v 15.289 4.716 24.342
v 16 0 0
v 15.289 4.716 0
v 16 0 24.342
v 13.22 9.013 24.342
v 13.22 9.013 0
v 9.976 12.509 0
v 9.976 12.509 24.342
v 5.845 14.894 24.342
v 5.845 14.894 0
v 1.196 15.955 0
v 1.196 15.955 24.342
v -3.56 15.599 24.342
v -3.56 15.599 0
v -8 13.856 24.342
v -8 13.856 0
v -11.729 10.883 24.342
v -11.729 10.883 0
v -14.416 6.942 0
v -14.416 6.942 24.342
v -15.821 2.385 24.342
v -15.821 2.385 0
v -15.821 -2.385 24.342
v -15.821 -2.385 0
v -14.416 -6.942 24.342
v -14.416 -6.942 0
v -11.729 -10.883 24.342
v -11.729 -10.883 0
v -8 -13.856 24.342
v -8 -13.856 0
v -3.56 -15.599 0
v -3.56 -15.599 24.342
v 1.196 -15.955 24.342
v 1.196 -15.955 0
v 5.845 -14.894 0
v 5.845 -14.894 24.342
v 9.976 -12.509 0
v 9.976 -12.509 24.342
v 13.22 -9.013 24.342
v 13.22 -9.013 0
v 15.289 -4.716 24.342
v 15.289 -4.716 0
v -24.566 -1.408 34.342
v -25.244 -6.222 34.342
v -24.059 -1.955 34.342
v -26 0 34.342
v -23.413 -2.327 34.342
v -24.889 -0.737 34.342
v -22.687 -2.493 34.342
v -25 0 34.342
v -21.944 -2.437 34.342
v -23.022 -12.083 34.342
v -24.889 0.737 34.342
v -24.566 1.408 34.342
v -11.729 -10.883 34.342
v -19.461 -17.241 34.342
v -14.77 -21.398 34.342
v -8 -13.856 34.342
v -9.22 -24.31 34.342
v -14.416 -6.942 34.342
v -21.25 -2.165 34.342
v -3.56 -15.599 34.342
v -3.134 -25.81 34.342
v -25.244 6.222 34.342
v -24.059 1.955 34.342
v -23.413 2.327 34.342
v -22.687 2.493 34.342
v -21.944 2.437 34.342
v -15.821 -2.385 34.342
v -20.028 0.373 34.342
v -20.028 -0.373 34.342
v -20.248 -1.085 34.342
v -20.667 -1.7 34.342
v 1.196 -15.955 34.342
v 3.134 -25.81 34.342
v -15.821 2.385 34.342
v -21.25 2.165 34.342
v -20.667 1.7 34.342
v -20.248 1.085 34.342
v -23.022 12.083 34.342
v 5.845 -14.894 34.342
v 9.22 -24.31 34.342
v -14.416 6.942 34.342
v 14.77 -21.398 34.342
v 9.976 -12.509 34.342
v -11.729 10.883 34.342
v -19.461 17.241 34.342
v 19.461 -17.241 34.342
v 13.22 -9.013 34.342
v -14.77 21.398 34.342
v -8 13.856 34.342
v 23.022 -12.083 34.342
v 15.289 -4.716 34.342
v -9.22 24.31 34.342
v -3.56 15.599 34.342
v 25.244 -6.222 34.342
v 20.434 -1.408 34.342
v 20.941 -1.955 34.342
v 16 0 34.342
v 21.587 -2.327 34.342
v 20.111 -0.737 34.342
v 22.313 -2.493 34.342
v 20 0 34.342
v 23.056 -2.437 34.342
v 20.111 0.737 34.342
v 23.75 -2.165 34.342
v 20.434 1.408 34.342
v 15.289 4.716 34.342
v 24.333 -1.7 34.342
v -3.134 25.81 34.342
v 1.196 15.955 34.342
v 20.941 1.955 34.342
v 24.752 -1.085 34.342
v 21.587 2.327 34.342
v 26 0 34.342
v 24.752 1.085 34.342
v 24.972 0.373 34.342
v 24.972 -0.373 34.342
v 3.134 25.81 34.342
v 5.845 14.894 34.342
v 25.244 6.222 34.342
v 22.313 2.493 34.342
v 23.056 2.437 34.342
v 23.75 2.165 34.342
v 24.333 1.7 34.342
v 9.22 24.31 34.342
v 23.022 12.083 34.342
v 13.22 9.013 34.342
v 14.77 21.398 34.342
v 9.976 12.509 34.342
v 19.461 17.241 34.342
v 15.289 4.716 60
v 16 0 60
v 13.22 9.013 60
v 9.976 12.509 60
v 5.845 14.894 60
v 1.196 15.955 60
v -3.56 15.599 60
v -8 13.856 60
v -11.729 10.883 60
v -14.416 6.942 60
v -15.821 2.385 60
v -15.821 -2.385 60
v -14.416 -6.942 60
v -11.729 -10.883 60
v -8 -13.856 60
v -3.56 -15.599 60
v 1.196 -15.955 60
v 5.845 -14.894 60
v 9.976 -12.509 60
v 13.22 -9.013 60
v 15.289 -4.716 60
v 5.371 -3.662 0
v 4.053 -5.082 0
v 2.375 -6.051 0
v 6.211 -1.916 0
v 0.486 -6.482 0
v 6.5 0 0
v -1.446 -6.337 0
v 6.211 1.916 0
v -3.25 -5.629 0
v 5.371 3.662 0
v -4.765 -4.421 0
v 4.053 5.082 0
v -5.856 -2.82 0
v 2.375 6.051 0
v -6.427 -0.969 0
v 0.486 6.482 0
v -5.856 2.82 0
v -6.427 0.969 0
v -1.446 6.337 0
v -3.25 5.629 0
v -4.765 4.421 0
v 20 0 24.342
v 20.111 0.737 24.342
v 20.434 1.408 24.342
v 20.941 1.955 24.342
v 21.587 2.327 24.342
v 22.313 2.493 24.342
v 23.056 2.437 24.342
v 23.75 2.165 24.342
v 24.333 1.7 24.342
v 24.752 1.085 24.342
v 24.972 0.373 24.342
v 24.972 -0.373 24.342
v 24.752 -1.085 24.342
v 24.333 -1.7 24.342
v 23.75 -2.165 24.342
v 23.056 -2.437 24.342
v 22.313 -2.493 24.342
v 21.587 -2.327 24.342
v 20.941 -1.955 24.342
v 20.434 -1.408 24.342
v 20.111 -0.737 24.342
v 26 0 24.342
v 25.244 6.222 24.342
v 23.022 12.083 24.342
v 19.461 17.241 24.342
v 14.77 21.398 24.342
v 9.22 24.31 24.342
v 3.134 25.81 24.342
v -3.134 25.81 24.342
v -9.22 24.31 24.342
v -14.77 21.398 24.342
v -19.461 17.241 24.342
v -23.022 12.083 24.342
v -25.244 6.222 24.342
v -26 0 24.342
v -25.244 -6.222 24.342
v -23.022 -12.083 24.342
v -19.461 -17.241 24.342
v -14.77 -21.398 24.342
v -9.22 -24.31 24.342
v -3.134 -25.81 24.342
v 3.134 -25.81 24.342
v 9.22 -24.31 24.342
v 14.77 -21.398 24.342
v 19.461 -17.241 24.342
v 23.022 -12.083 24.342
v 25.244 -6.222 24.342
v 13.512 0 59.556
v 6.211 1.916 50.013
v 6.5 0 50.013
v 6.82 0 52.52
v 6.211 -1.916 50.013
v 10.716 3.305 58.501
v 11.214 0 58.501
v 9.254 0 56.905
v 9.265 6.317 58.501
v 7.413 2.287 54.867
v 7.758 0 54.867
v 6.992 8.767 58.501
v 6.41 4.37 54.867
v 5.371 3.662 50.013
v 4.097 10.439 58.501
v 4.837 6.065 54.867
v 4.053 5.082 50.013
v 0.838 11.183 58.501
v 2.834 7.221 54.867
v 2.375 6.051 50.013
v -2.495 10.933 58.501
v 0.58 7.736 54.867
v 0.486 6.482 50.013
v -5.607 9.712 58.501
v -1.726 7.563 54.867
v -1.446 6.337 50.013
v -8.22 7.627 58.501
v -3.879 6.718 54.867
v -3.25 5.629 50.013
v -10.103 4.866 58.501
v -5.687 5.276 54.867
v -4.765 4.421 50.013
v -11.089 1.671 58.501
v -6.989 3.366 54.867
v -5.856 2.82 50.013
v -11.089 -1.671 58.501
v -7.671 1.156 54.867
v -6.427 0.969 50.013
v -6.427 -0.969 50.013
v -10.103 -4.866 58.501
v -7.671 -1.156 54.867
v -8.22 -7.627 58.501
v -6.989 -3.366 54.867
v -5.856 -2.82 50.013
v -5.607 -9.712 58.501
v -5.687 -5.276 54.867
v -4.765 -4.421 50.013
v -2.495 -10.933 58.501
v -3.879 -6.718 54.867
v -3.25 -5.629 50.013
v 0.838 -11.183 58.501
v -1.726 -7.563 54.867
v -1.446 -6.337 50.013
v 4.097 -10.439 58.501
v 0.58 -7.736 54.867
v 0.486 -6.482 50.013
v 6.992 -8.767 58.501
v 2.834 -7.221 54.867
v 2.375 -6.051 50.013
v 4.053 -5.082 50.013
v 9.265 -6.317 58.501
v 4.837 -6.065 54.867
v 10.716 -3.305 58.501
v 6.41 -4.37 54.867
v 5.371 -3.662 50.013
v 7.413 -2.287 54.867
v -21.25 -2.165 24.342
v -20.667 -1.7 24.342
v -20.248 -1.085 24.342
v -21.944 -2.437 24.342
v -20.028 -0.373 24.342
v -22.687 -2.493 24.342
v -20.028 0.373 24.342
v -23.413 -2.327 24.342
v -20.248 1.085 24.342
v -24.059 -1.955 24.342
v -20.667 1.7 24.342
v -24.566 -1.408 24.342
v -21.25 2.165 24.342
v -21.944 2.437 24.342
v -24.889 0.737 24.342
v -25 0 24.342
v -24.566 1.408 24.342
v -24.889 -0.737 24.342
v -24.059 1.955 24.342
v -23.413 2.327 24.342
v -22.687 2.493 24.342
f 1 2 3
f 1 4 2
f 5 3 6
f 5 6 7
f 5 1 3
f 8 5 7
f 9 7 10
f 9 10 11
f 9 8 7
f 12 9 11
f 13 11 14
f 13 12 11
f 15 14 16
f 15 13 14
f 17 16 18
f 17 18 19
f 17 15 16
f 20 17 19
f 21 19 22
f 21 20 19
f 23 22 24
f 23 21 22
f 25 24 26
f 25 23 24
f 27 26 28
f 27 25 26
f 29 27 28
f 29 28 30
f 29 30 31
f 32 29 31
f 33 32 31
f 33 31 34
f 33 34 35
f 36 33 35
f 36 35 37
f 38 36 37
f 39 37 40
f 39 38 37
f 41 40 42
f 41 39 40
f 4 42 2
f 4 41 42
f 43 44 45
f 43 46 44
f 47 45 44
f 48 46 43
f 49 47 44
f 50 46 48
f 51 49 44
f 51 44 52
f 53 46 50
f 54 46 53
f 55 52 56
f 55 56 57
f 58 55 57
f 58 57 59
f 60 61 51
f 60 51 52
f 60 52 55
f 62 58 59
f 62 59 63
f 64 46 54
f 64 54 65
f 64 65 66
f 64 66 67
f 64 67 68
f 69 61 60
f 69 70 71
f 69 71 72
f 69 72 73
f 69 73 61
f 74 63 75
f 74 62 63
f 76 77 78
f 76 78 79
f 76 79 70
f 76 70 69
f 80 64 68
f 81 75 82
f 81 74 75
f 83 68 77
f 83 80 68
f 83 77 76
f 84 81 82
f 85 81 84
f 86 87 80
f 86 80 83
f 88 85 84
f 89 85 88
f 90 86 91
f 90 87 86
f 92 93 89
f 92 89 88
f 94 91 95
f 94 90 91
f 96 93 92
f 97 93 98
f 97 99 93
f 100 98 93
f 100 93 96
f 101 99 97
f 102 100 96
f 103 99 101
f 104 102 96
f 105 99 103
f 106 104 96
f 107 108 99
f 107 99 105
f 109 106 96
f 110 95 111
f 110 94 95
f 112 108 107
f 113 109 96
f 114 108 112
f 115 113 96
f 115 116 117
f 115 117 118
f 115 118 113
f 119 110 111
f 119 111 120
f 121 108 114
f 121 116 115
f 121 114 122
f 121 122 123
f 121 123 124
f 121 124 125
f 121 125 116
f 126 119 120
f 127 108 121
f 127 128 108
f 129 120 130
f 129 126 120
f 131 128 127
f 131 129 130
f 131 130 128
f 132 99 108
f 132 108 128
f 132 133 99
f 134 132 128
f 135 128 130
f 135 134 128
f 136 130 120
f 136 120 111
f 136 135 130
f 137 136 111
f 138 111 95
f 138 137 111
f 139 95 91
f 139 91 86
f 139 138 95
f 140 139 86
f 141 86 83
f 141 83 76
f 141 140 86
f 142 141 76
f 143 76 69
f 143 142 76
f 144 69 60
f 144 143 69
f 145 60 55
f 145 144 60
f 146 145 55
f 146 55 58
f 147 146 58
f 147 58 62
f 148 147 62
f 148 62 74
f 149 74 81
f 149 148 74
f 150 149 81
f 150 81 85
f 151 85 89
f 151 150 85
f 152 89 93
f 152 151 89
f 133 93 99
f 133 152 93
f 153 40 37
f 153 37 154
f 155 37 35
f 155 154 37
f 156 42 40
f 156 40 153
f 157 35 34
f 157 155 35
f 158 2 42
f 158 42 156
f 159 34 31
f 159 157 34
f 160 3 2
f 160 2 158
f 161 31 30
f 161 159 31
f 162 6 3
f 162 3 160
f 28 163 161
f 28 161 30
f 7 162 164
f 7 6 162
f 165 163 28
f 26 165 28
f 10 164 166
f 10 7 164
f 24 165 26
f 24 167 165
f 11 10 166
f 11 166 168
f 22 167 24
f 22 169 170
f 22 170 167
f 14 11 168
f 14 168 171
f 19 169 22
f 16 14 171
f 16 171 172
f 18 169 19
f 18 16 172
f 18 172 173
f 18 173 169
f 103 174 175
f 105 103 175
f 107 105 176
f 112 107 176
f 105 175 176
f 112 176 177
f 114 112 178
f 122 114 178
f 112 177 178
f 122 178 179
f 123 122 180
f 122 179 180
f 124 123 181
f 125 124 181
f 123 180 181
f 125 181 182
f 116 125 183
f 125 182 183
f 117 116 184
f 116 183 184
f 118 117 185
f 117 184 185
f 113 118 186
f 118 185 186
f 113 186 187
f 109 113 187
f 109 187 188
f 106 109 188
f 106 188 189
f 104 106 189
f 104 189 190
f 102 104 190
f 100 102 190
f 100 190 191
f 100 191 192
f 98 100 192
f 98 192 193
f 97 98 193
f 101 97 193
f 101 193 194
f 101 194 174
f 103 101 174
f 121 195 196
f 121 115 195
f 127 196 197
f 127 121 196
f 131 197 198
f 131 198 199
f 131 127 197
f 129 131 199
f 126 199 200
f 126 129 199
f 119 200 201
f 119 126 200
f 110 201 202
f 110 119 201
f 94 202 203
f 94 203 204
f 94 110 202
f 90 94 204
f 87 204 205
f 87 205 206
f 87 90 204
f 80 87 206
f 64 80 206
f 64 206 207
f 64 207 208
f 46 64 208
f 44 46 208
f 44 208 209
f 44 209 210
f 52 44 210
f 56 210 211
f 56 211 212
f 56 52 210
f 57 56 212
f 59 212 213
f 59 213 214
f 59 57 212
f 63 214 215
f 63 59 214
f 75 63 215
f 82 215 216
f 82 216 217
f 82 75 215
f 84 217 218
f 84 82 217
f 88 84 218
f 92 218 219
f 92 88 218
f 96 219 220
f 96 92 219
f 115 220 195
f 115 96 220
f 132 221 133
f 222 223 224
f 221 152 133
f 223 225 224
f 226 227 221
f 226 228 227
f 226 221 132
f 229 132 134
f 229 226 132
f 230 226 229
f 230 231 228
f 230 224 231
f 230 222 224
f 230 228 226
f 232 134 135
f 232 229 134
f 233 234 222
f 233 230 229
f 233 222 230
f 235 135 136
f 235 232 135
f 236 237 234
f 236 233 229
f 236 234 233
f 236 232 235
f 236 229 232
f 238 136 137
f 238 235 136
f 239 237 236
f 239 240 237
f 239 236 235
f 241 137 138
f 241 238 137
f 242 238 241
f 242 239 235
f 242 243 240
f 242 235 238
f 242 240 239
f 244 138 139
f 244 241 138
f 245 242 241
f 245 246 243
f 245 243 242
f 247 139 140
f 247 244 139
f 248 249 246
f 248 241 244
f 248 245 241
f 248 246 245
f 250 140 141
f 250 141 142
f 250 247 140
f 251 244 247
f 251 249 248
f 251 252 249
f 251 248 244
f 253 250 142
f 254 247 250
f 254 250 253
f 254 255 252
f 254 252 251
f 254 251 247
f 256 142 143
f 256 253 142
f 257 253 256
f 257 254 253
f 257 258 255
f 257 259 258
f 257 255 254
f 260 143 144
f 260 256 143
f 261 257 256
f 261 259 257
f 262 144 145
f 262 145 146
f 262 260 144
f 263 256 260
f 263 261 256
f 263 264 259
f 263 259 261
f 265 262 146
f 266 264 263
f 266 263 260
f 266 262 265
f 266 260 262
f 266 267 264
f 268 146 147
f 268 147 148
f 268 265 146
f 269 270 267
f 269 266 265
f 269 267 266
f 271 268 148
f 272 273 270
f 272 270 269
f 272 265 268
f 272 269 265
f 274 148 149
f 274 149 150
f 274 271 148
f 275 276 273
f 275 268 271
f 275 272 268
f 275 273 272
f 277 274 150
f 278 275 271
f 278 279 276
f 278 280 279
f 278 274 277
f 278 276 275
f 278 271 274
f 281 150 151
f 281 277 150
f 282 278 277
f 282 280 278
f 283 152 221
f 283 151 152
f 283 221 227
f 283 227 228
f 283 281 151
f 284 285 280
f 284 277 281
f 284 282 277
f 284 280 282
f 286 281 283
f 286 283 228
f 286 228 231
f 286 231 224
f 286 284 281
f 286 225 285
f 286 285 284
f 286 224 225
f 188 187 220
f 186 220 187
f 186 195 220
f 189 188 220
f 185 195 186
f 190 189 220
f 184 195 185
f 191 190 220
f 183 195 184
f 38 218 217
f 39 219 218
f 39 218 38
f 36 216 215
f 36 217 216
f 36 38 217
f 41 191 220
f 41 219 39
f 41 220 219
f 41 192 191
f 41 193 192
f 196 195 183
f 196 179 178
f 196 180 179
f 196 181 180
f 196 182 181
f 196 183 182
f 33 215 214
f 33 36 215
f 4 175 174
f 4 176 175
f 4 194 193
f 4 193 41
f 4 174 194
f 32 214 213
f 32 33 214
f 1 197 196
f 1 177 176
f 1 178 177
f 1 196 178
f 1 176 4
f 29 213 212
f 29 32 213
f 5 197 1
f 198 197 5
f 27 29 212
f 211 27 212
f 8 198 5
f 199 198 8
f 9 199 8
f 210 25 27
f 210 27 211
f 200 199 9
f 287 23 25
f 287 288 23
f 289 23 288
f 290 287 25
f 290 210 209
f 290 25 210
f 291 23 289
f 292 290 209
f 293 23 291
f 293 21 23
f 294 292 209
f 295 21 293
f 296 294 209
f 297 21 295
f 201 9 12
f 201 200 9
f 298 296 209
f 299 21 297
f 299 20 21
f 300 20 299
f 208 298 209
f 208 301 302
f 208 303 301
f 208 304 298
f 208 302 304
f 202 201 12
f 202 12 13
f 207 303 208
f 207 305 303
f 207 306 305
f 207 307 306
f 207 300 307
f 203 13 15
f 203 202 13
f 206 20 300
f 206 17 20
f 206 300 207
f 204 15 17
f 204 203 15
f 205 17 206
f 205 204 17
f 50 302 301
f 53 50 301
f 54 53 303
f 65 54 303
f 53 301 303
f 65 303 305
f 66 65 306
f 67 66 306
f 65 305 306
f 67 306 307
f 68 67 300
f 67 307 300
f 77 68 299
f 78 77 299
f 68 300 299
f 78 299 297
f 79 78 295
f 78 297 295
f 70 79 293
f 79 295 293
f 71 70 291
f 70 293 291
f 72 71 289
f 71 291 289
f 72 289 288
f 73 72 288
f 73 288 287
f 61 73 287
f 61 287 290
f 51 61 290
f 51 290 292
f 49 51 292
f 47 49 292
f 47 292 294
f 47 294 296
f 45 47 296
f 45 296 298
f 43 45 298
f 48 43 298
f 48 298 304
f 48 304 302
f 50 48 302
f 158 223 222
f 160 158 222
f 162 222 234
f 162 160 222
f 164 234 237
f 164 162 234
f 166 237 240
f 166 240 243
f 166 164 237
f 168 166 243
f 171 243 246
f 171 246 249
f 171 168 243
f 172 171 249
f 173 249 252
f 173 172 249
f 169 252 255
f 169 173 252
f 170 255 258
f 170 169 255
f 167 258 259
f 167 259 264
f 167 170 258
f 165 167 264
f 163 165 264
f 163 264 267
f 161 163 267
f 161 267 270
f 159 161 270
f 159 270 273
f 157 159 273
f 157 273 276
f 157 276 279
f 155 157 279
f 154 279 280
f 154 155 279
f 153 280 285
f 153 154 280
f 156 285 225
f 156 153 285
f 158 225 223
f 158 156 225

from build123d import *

# Parameters (mm, degrees)
F4_D = 5


with BuildPart() as f2:
    # F0 (on Front) → F2 (revolve)
    with BuildSketch(Plane.XZ):
        with BuildLine():
            Line((6.5, 50.012508), (6.5, 0))
            Line((6.5, 0), (16, 0))
            Line((16, 0), (16, 24.341691))
            Line((16, 24.341691), (26, 24.341691))
            Line((26, 24.341691), (26, 34.341691))
            Line((26, 34.341691), (16, 34.341691))
            Line((16, 34.341691), (16, 60))
            ThreePointArc((16, 60), (9.254312, 56.904532), (6.5, 50.012508))
        make_face()
    revolve(axis=Axis((0, 0, 35.208348), (0, 0, 1)))

    # F4 (through all)
    with Locations(Plane.XY.offset(34.341691)):
        with Locations((-22.5, 0), (22.5, 0)):
            Hole(F4_D / 2)


solid = f2.part
